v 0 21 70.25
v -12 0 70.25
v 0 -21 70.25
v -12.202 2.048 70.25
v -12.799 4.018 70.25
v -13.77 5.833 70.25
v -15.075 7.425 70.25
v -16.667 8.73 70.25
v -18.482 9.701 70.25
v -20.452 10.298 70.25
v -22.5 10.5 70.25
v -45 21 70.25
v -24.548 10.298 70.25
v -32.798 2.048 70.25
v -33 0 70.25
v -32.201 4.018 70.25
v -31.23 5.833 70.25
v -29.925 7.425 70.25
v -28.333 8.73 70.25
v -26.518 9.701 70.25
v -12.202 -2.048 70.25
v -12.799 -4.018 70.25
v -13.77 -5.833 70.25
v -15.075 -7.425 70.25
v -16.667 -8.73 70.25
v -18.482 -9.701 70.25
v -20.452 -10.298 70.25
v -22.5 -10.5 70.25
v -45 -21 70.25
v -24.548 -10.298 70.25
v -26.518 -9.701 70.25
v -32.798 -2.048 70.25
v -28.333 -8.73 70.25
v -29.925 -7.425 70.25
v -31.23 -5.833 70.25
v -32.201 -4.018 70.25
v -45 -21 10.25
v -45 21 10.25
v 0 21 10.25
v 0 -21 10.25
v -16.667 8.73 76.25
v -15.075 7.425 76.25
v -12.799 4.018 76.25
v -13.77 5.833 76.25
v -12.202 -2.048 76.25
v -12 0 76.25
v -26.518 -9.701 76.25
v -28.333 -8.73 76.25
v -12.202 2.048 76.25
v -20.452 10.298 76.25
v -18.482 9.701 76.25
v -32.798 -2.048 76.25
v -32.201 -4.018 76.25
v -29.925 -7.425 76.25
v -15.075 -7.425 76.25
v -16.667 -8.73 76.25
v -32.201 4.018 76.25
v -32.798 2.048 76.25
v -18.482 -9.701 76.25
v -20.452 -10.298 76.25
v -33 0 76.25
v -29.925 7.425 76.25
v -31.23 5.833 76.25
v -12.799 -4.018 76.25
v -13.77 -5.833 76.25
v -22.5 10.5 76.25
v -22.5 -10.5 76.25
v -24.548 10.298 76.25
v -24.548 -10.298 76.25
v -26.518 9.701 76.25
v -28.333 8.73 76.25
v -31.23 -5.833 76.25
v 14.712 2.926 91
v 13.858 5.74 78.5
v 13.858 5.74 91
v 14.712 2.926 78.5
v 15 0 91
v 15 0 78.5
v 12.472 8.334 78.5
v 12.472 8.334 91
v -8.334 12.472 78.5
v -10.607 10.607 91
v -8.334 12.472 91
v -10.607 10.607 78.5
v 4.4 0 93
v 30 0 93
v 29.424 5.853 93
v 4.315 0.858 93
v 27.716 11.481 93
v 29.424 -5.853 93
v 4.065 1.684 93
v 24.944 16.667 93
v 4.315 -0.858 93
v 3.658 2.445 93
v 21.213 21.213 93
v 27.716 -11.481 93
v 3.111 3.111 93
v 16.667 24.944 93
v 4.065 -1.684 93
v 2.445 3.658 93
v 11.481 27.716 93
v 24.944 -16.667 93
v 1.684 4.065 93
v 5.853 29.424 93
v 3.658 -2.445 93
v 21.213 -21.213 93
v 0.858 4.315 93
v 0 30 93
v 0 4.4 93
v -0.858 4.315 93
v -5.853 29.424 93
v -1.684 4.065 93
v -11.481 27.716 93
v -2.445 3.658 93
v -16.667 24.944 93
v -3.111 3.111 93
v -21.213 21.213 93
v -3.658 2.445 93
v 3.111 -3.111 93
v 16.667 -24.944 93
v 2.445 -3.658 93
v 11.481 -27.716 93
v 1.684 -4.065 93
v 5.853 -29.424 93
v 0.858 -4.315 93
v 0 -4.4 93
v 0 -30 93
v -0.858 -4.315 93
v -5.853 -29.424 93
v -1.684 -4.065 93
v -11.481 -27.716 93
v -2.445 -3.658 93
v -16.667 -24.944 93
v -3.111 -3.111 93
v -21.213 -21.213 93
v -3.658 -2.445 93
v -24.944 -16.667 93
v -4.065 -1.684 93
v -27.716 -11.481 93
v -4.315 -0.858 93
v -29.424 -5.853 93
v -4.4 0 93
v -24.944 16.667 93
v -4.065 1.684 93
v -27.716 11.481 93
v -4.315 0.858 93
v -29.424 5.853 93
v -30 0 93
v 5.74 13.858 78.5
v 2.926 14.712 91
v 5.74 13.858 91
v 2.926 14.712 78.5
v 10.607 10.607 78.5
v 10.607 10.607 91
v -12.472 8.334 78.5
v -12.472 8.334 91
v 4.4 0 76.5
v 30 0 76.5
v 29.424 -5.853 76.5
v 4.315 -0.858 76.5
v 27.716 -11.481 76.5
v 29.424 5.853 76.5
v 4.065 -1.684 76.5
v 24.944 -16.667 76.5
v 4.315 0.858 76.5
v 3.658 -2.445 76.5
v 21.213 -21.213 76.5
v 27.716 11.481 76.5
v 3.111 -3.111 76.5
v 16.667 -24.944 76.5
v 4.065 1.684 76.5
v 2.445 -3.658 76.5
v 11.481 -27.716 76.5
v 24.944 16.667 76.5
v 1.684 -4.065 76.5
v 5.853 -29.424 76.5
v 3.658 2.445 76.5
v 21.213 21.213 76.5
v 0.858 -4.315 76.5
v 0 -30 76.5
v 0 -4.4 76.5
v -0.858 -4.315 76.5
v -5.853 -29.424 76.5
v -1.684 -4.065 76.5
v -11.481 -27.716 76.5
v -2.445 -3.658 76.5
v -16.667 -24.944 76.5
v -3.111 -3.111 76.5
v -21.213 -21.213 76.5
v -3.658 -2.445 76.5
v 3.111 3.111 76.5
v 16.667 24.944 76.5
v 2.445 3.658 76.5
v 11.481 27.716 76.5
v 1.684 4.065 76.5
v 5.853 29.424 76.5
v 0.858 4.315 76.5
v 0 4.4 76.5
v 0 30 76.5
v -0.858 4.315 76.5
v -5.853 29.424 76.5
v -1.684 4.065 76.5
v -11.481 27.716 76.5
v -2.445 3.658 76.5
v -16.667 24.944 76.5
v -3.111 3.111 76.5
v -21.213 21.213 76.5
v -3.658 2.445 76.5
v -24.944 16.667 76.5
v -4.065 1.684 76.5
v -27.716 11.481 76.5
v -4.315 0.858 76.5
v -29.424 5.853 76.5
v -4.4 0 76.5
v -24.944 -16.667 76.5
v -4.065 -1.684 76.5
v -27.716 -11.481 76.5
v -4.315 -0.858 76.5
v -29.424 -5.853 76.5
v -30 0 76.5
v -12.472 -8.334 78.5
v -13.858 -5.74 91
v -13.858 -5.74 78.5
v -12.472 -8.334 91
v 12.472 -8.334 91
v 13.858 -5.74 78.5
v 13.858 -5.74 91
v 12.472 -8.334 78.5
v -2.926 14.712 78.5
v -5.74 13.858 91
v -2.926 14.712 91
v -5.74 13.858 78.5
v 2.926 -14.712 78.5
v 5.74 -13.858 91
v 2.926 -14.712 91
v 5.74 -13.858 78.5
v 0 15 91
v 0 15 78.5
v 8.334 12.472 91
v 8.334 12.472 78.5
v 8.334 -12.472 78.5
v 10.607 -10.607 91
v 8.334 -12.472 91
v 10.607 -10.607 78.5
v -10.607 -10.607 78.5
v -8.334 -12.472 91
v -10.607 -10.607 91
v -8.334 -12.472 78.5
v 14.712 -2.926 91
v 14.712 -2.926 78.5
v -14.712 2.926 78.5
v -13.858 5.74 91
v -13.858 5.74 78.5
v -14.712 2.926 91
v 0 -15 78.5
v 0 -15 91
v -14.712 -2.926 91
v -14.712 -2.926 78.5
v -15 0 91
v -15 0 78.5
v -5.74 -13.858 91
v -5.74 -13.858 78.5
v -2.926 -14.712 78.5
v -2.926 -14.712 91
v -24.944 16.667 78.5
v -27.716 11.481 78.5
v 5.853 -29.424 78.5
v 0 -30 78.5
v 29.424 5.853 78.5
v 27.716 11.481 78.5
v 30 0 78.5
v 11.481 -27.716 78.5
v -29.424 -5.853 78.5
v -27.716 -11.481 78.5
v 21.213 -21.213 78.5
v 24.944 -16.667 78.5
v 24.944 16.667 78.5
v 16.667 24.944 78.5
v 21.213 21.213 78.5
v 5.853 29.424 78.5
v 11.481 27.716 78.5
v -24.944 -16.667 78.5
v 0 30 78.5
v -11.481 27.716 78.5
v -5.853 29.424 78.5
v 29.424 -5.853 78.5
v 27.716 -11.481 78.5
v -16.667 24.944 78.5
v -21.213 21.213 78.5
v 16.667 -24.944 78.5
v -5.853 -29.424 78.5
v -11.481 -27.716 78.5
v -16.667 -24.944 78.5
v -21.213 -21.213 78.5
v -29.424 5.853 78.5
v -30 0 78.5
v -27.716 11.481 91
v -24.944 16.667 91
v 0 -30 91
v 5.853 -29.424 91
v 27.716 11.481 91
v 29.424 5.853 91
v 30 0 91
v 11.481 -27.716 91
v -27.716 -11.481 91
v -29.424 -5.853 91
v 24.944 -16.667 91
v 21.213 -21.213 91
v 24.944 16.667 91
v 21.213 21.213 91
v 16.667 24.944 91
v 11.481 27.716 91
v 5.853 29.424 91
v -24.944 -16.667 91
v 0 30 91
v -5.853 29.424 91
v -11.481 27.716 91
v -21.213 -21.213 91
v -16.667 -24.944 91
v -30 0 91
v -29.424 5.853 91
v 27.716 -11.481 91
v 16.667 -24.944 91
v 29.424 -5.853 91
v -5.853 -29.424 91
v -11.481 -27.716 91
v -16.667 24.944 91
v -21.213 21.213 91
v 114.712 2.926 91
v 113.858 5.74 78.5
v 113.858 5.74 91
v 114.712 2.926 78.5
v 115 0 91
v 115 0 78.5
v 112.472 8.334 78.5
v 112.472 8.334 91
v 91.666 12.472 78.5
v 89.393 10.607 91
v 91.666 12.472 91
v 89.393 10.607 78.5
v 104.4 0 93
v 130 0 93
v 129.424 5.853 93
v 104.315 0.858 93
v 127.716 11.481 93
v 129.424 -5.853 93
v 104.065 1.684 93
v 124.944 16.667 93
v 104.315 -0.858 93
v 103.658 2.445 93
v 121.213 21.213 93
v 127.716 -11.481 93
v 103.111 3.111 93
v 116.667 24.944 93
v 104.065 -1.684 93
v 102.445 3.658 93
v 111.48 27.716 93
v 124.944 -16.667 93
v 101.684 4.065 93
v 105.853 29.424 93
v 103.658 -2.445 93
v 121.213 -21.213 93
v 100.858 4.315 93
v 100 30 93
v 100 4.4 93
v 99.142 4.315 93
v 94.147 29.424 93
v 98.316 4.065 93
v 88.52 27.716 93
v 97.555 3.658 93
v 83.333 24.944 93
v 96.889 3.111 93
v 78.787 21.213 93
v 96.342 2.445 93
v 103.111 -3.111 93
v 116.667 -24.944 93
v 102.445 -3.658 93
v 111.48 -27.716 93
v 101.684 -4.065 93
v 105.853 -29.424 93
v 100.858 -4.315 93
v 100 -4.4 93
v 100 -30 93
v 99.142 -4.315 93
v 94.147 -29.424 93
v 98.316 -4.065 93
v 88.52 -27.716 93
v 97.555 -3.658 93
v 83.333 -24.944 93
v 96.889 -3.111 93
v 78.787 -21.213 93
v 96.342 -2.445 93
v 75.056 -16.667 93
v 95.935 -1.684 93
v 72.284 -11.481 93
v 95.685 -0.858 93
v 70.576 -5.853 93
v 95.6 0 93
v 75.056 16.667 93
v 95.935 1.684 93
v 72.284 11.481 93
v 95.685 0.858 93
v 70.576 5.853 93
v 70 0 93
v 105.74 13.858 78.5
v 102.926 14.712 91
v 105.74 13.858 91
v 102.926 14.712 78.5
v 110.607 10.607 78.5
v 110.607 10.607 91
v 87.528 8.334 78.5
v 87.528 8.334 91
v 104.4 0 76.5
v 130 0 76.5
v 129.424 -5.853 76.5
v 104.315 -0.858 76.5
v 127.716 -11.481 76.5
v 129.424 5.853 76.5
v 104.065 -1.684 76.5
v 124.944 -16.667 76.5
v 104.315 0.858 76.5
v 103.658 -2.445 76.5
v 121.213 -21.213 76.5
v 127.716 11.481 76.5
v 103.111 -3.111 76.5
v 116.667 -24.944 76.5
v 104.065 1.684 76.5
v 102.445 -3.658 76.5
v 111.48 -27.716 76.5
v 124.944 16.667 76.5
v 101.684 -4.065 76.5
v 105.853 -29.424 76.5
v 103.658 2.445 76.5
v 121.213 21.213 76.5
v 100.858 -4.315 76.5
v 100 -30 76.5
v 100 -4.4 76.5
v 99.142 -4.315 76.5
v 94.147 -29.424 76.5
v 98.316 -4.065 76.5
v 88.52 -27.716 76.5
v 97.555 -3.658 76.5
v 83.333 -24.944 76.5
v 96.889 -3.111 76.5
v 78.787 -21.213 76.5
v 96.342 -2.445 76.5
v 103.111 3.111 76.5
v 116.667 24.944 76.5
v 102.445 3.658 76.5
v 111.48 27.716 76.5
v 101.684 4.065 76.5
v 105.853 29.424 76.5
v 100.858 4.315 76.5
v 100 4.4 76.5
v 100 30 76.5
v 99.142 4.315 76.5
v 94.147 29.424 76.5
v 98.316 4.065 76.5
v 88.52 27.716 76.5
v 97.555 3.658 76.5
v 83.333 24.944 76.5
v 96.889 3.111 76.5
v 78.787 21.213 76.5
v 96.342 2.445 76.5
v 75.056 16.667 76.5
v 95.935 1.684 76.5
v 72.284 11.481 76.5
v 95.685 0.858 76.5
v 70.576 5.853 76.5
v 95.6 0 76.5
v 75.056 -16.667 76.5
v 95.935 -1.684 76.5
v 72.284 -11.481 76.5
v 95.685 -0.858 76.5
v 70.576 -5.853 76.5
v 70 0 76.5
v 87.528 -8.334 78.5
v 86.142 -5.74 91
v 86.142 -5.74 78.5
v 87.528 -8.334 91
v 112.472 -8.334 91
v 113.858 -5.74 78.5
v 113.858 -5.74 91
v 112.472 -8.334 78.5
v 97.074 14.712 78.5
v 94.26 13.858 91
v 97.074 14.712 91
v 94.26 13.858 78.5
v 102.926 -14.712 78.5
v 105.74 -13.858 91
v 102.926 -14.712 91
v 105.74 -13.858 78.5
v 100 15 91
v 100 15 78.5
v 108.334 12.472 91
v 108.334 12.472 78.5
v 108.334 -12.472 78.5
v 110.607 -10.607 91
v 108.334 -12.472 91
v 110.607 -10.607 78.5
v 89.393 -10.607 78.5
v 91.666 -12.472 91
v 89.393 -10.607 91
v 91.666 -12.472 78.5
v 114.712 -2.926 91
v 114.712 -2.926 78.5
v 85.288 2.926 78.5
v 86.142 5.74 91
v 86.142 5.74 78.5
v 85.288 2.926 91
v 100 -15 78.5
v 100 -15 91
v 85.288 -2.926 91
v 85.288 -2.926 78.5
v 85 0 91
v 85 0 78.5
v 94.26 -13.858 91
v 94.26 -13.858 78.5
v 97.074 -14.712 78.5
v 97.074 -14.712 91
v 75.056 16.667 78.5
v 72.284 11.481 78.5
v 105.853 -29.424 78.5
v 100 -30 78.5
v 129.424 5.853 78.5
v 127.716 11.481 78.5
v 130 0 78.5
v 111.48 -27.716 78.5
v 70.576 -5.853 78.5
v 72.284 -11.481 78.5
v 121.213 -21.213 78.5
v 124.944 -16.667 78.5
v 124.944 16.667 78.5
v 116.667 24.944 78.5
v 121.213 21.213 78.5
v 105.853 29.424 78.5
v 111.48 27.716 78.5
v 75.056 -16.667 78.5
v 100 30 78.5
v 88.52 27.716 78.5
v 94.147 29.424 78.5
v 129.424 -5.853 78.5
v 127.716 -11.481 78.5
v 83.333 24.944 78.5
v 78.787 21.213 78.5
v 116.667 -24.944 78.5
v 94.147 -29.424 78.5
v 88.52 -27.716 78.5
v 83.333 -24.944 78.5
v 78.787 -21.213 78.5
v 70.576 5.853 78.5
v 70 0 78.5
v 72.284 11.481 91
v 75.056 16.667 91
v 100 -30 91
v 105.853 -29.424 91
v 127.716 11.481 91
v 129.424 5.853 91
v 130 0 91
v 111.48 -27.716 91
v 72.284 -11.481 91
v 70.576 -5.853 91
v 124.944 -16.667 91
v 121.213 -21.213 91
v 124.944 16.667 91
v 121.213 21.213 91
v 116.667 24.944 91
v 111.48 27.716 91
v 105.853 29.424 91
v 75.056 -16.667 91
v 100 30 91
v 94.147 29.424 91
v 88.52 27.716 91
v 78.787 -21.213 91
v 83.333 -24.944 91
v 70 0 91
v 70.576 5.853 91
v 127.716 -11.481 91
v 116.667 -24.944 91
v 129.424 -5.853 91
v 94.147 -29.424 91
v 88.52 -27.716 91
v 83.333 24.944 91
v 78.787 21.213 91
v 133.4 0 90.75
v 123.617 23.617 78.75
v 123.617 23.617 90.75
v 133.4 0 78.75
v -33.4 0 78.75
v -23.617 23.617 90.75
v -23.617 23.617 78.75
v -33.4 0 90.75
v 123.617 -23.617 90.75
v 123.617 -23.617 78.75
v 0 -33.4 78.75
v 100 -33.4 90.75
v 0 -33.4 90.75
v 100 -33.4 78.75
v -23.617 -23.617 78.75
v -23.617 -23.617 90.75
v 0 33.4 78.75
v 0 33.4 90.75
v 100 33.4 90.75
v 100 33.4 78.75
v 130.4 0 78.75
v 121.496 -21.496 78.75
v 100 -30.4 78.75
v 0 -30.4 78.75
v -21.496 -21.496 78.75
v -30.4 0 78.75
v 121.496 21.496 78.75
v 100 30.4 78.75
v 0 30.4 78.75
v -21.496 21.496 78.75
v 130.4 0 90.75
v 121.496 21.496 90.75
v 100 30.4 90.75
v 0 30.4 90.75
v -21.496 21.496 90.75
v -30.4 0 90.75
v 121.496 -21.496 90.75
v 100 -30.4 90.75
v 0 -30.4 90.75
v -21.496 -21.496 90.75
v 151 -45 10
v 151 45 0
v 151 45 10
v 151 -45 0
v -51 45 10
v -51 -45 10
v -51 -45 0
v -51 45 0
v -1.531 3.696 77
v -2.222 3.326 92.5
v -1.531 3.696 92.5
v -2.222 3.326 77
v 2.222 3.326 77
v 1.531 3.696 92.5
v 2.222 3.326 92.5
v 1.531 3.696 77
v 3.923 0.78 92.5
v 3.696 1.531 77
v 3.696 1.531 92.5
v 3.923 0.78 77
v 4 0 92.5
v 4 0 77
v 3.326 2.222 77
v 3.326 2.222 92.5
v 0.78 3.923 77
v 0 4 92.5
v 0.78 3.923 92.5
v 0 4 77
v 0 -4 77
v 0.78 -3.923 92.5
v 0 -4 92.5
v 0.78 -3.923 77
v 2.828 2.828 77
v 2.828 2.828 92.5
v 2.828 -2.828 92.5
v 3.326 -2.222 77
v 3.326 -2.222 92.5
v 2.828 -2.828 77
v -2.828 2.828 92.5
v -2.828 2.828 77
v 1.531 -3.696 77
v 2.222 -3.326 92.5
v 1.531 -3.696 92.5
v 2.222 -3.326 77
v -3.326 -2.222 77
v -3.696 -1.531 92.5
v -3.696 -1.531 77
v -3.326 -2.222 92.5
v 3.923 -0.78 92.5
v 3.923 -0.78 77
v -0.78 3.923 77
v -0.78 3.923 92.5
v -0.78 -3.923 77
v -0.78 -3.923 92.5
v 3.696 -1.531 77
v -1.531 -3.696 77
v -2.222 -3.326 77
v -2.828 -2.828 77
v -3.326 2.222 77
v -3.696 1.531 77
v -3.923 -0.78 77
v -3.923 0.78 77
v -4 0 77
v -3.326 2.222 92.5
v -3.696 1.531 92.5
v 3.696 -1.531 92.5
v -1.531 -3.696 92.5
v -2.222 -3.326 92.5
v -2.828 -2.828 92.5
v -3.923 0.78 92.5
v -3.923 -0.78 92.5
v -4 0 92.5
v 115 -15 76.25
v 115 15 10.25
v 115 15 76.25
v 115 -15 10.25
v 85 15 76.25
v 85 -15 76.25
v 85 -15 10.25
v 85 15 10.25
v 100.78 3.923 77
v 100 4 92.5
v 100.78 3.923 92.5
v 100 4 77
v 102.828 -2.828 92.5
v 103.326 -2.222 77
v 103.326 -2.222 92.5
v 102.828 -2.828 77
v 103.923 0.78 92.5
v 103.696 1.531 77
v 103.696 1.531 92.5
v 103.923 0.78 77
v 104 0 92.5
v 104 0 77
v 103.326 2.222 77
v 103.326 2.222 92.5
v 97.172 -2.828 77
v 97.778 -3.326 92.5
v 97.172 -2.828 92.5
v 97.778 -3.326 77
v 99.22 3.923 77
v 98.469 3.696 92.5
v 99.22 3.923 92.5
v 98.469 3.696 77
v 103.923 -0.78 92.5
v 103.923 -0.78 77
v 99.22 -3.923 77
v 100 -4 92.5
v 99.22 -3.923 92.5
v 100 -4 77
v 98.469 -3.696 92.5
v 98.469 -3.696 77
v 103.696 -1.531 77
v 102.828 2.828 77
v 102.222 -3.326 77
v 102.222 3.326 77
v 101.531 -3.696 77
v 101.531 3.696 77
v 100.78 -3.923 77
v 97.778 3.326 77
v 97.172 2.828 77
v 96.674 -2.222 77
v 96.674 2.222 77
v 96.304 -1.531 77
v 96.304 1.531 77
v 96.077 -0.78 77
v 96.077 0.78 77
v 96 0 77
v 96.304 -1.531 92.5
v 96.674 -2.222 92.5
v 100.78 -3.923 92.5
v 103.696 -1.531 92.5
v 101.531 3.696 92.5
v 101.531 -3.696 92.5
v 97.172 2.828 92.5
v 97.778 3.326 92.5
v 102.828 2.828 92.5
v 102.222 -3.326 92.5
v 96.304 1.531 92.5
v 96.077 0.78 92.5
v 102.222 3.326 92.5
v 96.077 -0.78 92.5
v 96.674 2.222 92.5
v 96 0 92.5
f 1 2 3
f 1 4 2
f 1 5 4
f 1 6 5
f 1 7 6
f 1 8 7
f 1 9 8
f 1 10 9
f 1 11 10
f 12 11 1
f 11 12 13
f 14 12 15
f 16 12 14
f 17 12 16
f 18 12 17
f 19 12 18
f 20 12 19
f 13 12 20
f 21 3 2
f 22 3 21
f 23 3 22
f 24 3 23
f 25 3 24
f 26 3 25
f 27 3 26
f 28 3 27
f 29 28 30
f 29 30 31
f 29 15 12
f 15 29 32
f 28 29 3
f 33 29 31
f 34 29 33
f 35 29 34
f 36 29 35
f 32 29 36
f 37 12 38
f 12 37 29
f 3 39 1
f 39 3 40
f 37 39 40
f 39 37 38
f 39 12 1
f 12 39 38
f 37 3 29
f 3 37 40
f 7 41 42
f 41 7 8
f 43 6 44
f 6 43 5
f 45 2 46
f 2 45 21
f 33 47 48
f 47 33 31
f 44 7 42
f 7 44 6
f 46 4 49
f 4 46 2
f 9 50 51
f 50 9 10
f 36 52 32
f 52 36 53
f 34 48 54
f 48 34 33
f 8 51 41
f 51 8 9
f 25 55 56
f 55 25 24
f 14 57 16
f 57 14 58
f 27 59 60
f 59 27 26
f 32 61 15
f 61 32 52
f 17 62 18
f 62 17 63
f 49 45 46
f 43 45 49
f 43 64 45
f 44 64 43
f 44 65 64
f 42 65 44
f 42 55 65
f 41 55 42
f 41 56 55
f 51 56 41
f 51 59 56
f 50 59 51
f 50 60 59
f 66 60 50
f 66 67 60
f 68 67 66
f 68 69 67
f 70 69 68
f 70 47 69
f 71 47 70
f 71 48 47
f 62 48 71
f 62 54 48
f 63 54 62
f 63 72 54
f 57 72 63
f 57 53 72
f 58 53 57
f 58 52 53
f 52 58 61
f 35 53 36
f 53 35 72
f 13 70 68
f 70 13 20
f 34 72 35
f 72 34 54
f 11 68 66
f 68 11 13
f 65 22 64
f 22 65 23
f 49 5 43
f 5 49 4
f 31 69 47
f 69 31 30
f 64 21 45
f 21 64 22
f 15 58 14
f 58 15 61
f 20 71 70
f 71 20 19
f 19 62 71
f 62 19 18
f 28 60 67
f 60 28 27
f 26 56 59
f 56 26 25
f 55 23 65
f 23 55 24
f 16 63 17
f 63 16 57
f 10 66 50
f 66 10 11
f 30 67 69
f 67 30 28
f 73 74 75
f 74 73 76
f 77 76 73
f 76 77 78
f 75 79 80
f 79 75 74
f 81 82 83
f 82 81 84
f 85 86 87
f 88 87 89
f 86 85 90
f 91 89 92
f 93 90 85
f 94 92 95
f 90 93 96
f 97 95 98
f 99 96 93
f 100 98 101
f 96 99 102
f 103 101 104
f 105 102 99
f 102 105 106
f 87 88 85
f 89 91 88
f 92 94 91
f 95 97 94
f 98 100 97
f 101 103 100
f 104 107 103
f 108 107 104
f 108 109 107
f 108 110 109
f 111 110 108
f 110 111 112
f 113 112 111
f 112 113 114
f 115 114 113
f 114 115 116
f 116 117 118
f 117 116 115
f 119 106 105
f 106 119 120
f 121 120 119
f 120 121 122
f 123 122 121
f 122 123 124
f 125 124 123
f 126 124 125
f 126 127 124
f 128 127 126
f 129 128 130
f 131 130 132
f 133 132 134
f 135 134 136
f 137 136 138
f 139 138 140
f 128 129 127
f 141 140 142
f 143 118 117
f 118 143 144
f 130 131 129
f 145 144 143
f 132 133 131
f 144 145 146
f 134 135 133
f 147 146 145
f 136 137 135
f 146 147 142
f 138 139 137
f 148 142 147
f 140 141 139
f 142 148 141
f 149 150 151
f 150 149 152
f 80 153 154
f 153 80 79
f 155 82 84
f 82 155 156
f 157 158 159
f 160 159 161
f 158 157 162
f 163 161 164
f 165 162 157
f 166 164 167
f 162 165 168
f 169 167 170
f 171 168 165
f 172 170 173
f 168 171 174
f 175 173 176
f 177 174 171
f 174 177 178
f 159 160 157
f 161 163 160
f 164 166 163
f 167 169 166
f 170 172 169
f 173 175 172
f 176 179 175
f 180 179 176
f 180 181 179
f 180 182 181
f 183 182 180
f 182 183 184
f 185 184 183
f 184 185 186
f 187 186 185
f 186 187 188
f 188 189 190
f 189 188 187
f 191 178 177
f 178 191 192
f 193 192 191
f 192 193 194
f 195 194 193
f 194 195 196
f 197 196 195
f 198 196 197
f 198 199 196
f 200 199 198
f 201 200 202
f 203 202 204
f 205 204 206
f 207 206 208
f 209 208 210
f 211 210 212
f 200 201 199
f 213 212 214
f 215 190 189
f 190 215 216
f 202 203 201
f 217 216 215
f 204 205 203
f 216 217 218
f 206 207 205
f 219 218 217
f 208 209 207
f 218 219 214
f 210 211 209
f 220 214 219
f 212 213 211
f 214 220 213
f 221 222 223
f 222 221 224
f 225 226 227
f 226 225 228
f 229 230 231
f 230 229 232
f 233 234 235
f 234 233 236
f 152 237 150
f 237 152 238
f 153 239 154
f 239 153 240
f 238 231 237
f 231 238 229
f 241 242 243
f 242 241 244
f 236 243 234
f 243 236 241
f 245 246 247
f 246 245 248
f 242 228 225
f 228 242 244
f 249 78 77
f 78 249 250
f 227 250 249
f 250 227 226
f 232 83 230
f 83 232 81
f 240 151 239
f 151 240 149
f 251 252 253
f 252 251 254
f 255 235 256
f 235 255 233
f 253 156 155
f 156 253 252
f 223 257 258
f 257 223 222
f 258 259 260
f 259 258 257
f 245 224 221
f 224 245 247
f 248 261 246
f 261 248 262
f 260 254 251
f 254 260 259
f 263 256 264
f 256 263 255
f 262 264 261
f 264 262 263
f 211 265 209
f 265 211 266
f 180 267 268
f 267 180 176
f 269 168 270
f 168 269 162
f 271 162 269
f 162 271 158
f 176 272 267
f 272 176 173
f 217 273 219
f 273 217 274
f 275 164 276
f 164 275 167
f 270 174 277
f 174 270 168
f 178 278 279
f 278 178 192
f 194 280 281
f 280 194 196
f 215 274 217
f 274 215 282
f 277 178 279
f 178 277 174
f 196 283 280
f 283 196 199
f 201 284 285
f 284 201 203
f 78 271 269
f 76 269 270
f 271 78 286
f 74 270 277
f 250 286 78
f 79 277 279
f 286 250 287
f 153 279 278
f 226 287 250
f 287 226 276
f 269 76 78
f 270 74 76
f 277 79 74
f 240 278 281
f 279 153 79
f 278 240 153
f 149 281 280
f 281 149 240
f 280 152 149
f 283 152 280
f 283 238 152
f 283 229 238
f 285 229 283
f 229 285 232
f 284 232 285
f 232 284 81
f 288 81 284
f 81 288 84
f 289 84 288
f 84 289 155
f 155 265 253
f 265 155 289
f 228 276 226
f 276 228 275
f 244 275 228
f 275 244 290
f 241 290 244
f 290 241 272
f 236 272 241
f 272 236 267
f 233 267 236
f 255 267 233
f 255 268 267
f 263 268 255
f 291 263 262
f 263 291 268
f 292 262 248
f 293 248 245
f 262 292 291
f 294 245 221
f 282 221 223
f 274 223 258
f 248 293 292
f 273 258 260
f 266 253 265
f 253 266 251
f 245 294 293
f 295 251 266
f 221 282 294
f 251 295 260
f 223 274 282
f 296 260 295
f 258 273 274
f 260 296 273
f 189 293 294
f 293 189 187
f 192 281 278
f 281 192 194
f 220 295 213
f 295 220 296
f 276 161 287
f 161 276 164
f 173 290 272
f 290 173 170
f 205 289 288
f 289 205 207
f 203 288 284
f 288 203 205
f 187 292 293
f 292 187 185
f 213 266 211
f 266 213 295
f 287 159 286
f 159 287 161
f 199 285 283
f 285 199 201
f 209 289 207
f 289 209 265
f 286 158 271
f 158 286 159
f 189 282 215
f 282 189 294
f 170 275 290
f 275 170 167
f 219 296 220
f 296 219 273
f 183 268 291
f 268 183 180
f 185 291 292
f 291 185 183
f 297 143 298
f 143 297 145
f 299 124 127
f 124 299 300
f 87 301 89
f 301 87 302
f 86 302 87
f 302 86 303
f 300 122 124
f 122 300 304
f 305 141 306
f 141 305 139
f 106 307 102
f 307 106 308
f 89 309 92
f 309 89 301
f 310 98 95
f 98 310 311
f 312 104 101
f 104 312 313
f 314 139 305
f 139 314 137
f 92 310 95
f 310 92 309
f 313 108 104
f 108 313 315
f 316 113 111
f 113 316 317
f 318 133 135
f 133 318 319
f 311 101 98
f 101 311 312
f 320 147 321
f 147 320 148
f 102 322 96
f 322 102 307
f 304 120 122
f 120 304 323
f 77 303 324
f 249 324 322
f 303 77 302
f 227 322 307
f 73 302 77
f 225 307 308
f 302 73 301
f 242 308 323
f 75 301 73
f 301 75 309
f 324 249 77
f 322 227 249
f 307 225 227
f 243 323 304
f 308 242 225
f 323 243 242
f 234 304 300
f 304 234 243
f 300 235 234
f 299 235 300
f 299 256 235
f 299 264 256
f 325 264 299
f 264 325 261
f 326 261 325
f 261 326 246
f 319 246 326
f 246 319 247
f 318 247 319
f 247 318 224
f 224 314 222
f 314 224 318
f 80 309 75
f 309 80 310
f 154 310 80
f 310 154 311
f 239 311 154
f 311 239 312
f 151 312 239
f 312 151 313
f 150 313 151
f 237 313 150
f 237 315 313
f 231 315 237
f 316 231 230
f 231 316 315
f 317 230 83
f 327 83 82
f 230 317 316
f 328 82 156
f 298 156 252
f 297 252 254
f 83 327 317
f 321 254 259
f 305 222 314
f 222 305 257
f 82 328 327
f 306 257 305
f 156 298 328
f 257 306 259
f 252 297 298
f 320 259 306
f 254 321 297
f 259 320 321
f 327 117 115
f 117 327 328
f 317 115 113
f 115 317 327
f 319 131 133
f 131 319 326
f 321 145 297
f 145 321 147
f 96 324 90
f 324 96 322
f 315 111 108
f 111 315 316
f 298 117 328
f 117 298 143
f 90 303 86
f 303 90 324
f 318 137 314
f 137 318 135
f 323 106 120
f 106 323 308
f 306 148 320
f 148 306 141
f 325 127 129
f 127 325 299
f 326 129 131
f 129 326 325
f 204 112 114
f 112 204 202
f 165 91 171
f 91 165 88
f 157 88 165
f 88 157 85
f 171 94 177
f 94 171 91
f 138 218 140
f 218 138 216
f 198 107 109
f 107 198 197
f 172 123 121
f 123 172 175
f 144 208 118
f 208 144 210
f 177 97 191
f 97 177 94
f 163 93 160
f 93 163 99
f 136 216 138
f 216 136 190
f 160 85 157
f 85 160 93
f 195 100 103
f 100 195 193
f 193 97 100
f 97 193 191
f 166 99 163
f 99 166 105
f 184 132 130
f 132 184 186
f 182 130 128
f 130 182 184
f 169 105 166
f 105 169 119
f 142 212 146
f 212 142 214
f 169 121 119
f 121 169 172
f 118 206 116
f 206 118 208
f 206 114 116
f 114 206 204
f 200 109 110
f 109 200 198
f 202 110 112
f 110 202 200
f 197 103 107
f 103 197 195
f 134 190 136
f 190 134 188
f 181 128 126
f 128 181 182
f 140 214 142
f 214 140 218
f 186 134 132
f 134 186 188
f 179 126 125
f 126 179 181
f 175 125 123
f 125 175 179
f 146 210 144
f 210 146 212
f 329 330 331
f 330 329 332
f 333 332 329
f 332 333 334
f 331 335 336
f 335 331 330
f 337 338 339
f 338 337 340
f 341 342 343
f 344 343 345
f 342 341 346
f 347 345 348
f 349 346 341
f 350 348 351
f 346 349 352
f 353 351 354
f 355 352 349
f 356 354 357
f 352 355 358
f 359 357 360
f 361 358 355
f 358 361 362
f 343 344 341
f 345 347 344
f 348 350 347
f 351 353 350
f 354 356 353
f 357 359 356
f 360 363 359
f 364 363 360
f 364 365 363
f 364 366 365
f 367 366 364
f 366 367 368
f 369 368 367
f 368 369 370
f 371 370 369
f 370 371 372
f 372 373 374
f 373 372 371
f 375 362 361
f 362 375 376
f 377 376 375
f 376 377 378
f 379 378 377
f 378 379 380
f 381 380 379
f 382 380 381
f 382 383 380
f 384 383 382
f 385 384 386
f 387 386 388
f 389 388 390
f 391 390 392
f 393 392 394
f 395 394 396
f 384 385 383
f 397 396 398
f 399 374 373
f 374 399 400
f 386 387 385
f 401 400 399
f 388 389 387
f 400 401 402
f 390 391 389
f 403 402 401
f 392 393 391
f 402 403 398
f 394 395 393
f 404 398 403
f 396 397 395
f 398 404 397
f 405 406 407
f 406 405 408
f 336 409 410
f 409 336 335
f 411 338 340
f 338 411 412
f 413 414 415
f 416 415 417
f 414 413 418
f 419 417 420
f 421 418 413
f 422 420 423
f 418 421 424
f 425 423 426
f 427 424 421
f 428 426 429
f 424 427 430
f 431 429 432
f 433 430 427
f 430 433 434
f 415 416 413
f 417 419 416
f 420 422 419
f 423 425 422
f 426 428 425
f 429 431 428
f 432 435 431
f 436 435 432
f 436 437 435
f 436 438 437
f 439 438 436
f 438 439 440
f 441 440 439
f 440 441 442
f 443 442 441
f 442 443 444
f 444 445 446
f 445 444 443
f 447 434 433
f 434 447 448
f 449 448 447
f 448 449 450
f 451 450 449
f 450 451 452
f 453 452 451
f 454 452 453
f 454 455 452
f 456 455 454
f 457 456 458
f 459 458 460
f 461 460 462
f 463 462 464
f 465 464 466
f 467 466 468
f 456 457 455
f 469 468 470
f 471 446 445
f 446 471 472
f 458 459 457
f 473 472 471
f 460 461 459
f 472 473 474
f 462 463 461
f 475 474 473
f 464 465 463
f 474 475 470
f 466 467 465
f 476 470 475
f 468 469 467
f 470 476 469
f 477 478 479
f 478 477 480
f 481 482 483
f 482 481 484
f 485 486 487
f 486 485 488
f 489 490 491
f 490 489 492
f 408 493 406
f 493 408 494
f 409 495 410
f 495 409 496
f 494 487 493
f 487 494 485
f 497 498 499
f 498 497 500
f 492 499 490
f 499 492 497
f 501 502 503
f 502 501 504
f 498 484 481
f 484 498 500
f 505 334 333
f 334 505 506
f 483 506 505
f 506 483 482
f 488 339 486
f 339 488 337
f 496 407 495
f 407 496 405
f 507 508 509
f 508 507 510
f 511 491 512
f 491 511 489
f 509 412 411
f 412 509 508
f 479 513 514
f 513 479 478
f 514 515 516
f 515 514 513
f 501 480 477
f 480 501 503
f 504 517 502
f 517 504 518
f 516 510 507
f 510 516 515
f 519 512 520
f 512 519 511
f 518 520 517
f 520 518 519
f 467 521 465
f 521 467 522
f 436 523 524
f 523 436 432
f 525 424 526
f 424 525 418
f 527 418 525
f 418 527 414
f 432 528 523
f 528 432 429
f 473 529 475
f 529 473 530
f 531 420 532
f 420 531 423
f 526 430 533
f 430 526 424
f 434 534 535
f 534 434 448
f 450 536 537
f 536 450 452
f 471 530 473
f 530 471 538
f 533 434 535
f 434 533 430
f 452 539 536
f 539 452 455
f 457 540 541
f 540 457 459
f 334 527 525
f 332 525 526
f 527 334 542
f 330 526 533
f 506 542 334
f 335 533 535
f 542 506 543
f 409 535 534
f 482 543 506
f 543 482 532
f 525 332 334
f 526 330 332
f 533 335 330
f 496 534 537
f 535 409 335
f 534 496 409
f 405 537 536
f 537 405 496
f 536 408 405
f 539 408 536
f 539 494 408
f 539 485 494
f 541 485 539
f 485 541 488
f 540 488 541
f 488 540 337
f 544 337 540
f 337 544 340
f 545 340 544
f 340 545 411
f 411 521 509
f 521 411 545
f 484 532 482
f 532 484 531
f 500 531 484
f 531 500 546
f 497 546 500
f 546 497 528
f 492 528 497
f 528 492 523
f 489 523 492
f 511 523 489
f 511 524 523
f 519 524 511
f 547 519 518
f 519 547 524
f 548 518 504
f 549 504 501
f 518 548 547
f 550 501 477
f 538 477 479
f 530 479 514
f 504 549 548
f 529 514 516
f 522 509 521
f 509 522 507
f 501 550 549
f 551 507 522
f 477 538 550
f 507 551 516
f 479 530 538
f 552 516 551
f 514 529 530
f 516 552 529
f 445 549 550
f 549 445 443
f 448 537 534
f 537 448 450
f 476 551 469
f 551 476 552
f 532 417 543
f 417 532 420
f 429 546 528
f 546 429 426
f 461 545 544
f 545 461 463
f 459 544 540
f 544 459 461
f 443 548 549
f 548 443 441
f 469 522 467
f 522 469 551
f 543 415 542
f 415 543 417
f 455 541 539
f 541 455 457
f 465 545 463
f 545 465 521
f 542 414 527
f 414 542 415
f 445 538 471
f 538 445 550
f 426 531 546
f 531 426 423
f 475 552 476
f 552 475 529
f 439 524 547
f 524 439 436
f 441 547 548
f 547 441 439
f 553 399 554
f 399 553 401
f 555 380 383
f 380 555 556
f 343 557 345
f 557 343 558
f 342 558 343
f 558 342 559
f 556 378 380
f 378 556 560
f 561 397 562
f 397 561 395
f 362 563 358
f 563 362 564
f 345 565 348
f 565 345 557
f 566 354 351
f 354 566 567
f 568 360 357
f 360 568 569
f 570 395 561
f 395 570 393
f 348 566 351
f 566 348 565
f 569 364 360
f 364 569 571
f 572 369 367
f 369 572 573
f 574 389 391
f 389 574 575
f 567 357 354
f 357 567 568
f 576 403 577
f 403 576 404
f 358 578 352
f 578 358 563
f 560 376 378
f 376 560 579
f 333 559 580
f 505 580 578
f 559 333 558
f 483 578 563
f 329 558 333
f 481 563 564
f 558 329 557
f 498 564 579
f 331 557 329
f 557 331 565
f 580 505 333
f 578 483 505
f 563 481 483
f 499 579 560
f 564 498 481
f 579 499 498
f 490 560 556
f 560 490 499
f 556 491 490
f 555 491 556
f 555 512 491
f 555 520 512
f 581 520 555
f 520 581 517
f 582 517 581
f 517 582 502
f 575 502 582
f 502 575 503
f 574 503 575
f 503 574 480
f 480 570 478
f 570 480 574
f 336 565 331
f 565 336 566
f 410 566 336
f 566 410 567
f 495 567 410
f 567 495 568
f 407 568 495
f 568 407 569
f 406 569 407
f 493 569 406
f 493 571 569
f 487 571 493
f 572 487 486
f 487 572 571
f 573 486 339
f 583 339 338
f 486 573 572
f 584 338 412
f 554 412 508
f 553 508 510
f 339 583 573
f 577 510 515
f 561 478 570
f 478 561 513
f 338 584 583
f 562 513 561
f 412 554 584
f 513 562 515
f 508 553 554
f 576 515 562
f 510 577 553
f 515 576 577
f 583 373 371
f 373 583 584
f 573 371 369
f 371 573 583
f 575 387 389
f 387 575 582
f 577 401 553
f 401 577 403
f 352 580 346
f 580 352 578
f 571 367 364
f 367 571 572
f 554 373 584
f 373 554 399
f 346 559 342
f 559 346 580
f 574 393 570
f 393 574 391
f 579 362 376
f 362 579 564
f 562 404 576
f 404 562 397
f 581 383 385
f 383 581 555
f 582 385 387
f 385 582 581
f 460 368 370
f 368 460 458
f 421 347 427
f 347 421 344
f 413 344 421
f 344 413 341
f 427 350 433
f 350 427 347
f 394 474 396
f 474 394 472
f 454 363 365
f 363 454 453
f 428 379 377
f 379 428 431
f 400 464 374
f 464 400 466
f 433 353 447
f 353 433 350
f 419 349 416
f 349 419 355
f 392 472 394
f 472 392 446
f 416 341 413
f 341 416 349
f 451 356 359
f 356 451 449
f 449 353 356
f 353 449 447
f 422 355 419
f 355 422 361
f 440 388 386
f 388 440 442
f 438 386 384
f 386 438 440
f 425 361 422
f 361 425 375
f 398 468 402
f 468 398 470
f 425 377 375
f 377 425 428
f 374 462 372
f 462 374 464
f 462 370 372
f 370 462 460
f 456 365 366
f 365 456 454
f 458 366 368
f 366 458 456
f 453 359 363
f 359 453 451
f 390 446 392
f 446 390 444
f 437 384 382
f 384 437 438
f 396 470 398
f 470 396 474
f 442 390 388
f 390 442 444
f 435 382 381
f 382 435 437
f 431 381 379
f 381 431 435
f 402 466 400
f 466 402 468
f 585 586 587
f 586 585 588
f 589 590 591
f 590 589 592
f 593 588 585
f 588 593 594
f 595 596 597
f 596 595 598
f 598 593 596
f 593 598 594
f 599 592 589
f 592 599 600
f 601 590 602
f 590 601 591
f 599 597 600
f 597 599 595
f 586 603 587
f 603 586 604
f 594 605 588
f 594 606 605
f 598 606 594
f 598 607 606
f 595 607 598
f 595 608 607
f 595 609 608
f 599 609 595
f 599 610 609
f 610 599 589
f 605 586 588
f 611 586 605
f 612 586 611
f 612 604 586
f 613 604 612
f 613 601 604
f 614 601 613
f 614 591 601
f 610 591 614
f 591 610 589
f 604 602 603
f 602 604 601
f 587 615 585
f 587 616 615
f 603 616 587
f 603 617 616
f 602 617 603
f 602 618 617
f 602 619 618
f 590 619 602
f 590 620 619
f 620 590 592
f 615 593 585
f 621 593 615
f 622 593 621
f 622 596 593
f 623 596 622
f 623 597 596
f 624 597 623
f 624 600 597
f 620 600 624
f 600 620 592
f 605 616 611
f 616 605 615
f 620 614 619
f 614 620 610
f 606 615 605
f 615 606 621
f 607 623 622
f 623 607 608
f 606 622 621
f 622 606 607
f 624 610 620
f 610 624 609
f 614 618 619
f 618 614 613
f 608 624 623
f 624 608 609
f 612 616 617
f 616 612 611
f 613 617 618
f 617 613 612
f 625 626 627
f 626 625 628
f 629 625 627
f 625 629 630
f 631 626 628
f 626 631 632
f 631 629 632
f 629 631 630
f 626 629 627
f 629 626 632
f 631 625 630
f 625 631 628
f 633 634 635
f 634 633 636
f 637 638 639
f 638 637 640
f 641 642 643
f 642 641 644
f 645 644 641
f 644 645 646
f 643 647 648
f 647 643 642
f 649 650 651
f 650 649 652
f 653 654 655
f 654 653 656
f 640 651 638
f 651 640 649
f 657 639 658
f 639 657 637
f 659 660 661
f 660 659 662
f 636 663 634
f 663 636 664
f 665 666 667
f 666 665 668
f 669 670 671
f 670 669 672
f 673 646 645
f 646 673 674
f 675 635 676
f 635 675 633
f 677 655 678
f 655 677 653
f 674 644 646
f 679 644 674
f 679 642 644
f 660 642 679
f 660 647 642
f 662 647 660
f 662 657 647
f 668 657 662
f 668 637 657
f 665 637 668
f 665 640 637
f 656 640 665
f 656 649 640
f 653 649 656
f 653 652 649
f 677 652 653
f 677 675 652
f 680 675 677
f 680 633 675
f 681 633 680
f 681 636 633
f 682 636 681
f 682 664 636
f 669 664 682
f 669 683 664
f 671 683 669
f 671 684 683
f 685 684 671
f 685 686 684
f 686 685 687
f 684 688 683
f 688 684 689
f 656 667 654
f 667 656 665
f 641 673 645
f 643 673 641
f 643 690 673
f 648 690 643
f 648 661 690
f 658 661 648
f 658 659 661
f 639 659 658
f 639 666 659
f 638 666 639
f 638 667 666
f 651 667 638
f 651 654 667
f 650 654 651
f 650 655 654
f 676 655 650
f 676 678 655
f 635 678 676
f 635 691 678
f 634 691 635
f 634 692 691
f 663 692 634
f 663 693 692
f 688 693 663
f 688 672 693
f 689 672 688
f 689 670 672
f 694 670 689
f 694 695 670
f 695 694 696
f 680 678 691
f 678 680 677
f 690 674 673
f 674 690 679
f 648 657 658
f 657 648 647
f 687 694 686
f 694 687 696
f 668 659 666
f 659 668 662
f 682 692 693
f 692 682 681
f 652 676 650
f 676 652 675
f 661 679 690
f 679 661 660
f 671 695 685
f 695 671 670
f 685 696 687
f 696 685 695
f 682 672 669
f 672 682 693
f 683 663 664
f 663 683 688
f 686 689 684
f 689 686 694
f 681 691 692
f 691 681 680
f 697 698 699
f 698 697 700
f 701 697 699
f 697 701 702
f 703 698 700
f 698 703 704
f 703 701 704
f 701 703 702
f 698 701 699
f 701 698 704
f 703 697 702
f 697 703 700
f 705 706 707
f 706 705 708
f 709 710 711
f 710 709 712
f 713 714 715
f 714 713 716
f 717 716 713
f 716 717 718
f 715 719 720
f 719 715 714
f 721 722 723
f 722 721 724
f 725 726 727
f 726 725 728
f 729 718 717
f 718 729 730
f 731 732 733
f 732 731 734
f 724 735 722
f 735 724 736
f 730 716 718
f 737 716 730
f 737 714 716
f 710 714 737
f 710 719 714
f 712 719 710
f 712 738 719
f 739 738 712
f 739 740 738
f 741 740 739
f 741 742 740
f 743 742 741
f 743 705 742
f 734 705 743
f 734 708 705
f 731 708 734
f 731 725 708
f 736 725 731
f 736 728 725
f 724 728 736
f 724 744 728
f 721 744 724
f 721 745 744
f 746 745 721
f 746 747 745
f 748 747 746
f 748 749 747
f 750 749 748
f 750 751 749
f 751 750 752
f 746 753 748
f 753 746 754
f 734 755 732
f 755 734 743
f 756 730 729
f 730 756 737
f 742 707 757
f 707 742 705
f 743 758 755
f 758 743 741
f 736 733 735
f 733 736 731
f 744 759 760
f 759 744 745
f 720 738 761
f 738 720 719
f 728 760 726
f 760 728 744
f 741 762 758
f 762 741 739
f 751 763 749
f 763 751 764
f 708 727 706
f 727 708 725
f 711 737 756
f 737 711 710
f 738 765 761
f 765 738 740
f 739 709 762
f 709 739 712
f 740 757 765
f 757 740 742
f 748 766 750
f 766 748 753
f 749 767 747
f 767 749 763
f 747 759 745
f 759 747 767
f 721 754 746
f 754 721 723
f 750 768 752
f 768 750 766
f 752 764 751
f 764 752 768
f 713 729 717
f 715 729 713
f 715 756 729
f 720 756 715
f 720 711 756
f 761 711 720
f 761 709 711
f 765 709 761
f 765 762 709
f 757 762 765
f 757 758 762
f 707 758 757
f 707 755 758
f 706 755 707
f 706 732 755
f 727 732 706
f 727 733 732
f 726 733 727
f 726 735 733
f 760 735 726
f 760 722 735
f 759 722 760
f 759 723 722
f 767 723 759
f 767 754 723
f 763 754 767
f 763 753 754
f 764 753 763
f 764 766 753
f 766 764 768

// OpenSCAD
$fn = 32;

// ------------------------------------------------------------------------
// Motor belt drive: span 100 mm, pulleys d60, belt 12 mm wide
// Every part is its own module, assembly() places every instance.
// ------------------------------------------------------------------------

// --- part 1 ---
module base_plate() {
  difference() {
    translate([-101, -45, 0]) cube([202, 90, 10]);
  }
}

// --- part 2 ---
module motor() {
  union() {
    translate([-30, -21, 0]) cube([60, 42, 45]);
    translate([33, 0, 22.5]) rotate([0, 90, 0]) cylinder(h = 6, d = 21, center = true);
  }
}

// --- part 3 ---
module drive_shaft() {
  translate([0, 0, -7.75]) cylinder(h = 15.5, d = 8);
}

// --- part 4 ---
module pulley_drive() {
  difference() {
    union() {
      cylinder(h = 16.5, d = 30);
      cylinder(h = 2, d = 60);
      translate([0, 0, 14.5]) cylinder(h = 2, d = 60);
    }
    translate([0, 0, -1]) cylinder(h = 18.5, d = 8.8);
  }
}

// --- part 5 ---
module idler_post() {
  translate([-15, -15, 0]) cube([30, 30, 66]);
}

// --- part 6 ---
module driven_shaft() {
  translate([0, 0, -7.75]) cylinder(h = 15.5, d = 8);
}

// --- part 7 ---
module pulley_driven() {
  difference() {
    union() {
      cylinder(h = 16.5, d = 30);
      cylinder(h = 2, d = 60);
      translate([0, 0, 14.5]) cylinder(h = 2, d = 60);
    }
    translate([0, 0, -1]) cylinder(h = 18.5, d = 8.8);
  }
}

// --- part 8 ---
module drive_belt() {
  difference() {
    linear_extrude(height = 12) polygon(points = concat([for (a = [90 : 45 : 270]) [33.4 * cos(a), 33.4 * sin(a)]], [for (a = [270 : 45 : 450]) [100 + 33.4 * cos(a), 33.4 * sin(a)]]));
    translate([0, 0, -1]) linear_extrude(height = 14) polygon(points = concat([for (a = [90 : 45 : 270]) [30.4 * cos(a), 30.4 * sin(a)]], [for (a = [270 : 45 : 450]) [100 + 30.4 * cos(a), 30.4 * sin(a)]]));
  }
}

// --- assembly ---
module assembly() {
  color([0.80, 0.24, 0.20]) translate([50, 0, 0]) rotate([0, 0, 0]) base_plate();
  color([0.20, 0.45, 0.75]) translate([0, 0, 40.25]) rotate([0, 270, 0]) motor();
  color([0.25, 0.62, 0.32]) translate([0, 0, 84.75]) rotate([0, 0, 0]) drive_shaft();
  color([0.92, 0.70, 0.18]) translate([0, 0, 76.5]) rotate([0, 0, 0]) pulley_drive();
  color([0.58, 0.35, 0.70]) translate([100, 0, 10.25]) rotate([0, 0, 0]) idler_post();
  color([0.16, 0.66, 0.66]) translate([100, 0, 84.75]) rotate([0, 0, 0]) driven_shaft();
  color([0.85, 0.48, 0.18]) translate([100, 0, 76.5]) rotate([0, 0, 0]) pulley_driven();
  color([0.55, 0.60, 0.65]) translate([0, 0, 78.75]) rotate([0, 0, 0]) drive_belt();
}

assembly();
